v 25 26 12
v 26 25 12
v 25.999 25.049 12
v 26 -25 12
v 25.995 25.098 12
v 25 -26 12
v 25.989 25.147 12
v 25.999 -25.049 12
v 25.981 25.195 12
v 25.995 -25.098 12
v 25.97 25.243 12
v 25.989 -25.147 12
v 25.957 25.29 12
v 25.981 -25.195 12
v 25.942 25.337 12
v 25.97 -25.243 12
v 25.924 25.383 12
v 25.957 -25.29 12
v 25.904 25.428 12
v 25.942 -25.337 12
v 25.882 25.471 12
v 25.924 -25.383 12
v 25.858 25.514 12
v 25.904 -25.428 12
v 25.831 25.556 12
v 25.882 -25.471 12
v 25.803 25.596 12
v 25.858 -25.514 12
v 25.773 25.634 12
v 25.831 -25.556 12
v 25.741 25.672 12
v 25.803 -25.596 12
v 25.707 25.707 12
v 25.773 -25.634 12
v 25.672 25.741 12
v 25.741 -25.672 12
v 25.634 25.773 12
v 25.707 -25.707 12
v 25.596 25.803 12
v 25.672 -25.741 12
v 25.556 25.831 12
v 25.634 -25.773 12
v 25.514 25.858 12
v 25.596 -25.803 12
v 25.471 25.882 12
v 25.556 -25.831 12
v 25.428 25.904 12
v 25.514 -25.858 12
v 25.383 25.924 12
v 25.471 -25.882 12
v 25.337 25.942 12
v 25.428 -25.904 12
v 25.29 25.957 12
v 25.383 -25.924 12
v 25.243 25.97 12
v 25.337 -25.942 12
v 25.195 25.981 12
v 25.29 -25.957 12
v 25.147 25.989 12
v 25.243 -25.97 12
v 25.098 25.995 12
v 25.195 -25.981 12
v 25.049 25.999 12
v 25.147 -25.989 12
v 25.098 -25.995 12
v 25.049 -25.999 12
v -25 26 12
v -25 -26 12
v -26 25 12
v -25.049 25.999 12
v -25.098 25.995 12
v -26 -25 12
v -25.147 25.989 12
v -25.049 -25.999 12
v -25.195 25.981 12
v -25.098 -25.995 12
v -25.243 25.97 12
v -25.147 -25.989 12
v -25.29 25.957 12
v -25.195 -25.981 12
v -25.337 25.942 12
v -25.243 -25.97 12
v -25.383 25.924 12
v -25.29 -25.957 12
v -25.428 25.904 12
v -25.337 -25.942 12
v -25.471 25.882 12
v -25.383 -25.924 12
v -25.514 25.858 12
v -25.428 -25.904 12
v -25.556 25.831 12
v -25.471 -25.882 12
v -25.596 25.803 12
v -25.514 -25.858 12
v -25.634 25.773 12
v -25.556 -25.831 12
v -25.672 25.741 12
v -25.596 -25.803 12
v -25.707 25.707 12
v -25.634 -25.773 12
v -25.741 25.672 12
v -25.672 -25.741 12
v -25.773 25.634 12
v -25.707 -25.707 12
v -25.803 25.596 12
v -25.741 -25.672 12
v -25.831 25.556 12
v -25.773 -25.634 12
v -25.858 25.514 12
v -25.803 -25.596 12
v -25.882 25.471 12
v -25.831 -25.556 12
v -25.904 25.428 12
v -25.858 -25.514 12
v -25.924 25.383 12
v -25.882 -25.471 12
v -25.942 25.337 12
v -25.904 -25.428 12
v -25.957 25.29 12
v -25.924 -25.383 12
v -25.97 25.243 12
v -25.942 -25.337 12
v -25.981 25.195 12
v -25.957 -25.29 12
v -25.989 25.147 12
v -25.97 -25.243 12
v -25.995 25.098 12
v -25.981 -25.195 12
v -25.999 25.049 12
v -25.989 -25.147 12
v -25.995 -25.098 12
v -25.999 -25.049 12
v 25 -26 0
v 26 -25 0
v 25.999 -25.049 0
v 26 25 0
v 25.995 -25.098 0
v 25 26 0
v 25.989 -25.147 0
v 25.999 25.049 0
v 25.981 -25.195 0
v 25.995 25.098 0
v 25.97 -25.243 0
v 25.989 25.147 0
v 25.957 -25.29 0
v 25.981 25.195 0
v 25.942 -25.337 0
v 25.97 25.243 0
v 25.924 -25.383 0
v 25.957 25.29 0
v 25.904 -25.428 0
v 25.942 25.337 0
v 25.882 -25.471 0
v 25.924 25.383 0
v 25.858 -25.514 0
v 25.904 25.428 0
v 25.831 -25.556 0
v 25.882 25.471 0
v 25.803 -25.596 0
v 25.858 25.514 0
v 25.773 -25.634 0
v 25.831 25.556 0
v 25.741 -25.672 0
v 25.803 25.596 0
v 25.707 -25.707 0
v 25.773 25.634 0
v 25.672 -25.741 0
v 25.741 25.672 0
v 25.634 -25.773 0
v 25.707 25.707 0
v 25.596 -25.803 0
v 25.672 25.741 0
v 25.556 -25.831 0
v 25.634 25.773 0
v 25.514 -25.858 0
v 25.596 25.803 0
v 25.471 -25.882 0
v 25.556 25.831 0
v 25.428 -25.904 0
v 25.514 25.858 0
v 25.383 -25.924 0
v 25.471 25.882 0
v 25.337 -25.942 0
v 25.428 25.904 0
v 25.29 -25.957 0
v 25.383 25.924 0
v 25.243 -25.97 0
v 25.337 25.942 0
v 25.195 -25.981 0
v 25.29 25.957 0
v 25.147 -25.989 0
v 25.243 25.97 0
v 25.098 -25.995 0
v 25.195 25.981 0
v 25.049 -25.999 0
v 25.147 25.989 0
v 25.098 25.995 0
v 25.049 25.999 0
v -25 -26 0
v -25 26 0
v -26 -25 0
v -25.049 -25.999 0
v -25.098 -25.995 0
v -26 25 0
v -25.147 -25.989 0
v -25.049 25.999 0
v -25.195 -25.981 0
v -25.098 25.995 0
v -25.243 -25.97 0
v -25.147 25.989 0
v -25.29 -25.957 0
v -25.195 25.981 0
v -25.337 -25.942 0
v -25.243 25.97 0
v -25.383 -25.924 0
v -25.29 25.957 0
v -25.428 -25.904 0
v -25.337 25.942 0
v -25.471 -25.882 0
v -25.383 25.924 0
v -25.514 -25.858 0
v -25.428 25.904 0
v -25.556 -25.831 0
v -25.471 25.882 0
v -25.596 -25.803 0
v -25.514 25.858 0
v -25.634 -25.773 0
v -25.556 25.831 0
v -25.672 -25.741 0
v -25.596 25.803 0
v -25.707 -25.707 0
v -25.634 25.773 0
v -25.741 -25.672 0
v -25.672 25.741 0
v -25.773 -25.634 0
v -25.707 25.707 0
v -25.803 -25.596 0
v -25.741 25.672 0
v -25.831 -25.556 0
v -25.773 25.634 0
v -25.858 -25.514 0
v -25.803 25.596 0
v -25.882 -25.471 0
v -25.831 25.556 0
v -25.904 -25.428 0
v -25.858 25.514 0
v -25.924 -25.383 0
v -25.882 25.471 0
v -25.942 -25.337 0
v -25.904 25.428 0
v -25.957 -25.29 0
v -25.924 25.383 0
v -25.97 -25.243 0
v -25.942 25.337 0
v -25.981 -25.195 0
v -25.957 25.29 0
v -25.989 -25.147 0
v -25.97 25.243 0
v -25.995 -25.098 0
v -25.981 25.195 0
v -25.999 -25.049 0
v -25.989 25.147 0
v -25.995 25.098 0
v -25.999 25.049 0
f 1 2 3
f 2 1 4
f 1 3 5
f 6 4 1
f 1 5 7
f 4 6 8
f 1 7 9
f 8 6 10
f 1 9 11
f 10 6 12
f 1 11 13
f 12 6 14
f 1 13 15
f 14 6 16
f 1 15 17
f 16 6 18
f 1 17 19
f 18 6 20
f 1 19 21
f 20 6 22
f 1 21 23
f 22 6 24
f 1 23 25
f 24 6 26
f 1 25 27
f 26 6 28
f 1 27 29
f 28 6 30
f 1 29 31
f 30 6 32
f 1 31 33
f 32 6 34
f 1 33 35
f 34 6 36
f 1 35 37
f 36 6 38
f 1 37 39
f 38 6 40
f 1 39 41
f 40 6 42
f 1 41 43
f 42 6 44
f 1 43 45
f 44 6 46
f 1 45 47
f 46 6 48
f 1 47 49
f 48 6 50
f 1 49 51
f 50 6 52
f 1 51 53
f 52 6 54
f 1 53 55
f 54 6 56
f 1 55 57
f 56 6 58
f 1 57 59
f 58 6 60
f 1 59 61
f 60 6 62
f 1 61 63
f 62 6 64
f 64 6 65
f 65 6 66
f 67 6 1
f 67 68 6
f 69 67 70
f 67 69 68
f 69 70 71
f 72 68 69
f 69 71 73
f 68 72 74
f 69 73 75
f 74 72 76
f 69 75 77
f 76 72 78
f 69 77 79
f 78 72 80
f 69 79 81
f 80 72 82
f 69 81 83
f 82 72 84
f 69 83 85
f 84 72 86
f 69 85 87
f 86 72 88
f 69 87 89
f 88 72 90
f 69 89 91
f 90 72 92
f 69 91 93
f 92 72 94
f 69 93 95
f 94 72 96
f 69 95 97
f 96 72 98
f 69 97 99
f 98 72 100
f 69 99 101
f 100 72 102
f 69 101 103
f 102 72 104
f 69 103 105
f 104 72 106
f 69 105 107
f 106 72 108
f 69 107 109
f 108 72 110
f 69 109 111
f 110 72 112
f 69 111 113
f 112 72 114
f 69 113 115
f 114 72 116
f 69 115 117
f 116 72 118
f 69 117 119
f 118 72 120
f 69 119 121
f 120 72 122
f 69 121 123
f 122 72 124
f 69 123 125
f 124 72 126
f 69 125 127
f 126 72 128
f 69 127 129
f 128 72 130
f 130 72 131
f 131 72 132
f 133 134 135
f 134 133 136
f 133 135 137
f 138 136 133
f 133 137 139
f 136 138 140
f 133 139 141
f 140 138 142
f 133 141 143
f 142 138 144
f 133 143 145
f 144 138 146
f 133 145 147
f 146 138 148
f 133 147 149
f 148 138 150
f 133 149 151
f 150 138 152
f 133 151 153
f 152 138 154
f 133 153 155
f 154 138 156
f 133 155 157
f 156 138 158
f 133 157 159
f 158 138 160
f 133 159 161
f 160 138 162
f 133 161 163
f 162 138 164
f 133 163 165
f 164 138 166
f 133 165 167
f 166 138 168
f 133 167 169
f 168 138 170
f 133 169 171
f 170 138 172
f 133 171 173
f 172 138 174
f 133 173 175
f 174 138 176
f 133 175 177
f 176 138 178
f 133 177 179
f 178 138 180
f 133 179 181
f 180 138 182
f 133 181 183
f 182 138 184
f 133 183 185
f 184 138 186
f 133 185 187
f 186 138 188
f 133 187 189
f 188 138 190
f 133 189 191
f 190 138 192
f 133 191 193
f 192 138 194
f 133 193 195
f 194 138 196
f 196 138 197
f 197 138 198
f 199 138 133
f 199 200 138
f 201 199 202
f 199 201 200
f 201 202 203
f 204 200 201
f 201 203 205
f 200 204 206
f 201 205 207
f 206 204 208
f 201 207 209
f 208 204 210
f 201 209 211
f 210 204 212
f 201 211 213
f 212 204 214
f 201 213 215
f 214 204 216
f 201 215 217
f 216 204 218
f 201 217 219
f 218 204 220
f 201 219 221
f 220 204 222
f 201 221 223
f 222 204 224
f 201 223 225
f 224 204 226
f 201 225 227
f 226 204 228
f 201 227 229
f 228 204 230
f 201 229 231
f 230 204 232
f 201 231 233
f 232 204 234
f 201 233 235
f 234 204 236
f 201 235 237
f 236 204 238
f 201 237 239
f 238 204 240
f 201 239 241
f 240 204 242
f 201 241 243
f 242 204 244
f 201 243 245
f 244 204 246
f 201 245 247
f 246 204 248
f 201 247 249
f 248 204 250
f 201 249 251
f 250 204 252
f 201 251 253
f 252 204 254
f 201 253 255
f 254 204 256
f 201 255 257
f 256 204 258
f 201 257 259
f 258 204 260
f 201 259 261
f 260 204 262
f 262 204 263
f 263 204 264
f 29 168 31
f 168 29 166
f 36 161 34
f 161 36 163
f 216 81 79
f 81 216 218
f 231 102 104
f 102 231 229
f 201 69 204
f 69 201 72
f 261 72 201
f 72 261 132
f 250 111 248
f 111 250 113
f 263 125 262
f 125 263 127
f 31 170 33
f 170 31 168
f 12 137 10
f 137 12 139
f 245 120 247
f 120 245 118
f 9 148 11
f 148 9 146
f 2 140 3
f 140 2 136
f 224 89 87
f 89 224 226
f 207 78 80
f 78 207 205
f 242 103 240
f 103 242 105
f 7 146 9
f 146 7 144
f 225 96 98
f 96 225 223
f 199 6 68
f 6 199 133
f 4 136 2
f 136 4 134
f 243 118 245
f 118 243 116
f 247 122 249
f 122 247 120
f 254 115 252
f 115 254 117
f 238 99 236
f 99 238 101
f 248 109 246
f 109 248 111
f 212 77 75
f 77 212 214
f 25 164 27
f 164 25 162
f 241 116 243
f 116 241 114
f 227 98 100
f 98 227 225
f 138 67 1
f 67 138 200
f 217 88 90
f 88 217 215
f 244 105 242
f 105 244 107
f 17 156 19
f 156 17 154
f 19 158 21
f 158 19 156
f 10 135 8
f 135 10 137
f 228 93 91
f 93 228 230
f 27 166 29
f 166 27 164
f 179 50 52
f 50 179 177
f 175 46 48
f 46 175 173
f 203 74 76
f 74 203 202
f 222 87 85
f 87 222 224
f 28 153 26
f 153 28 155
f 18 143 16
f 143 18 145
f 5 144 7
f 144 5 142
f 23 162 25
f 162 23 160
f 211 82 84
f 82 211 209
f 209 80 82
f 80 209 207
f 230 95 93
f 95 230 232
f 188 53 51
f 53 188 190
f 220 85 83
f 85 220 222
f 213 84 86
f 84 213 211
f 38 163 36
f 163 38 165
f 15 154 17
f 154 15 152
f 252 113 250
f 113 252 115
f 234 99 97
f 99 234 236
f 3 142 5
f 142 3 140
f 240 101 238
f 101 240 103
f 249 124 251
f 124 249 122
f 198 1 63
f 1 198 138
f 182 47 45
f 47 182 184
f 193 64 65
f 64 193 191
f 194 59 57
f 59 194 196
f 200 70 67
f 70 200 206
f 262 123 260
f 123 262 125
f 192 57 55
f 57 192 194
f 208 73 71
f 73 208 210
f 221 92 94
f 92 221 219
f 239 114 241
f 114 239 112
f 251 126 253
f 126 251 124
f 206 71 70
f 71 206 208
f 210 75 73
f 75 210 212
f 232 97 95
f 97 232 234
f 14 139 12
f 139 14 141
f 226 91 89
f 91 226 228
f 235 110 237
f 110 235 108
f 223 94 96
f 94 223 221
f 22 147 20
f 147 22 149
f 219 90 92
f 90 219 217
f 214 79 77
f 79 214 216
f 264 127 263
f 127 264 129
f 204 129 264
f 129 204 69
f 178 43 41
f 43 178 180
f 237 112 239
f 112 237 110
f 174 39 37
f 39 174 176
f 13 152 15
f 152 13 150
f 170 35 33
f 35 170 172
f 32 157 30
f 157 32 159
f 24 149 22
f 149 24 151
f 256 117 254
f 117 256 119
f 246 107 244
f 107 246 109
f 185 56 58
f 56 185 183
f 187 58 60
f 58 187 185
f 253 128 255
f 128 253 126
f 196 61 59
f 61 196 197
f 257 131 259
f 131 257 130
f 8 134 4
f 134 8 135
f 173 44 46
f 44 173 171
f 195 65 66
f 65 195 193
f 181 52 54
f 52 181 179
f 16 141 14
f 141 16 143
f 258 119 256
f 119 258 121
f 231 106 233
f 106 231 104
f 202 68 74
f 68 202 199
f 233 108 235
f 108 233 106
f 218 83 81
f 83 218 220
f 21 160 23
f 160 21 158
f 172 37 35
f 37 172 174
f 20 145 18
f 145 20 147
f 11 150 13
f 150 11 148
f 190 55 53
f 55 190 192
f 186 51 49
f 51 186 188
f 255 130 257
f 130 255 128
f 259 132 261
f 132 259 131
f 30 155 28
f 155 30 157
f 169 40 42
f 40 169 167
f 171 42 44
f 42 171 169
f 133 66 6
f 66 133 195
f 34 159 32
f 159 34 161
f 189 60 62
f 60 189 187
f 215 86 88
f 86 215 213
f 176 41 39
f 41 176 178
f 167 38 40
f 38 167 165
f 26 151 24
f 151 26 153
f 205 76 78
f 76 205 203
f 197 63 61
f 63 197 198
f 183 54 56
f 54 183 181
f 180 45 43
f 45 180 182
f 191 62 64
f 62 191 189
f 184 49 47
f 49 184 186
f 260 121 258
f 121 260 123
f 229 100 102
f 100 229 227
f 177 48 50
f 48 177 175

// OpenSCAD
EXTRA_MARGIN = 14; // initially 6
SENSOR_WIDTH = 70 + EXTRA_MARGIN;
SENSOR_HEIGHT = 70 + EXTRA_MARGIN;

BASE_THICKNESS = 2; // initially 1
CORNER_CURVE_DIAMETER = 10; // initially 3

WALL_THICKNESS = 2;
TOTAL_WALL_HEIGHT = 32; // initially 25
WALL_HEIGHT = 18;
FRONT_WALL_HEIGHT = TOTAL_WALL_HEIGHT - WALL_HEIGHT + BASE_THICKNESS - 1; // Fix with BASE_THICKNESS - 1 (initial thickness was 1)


/* [MOUNTING ELEMS] */
HOLE_DIAMETER = 3.0; // initially 2.7
HOLE_HOLDER = 6.65;
SCREW_WALL_THICKNESS = 2;
SCREW_HEAD_DIAMETER = 6.4; // M3 screw
SCREW_HEAD_THICKNESS = 3.07; // M3 screw
SCREW_OFFSET = 0.7;


//Cut-outs dimensions
CABLE_PORT_HEIGHT = 21;
AIR_INTAKE_DIAMETER = 7.15;
FAN_SIZE = 35;
FAN_HEIGHT = 10;

PCB_THICKNESS = 1.64;
TOTAL_PCB_THICKNESS = 4.10;
CHIP_THICKNESS = TOTAL_PCB_THICKNESS - PCB_THICKNESS + 1; //initially +0.5
SLOT_HEIGHT = CHIP_THICKNESS + 2.5; //initially + 2

// WEMOS
WEMOS_WIDTH = 61.5;
WEMOS_HEIGHT = 27.5;

WEMOS_TOTAL_THICKNESS = 4.8;
WEMOS_PCB_THICKNESS = PCB_THICKNESS;
WEMOS_SUPPORT_HEIGHT = WEMOS_TOTAL_THICKNESS - WEMOS_PCB_THICKNESS + 2;

WEMOS_OFFSET = 5;
WEMOS_SCREW_OFFSET = 0.5;   //initially 0.8

//DHT22
DHT_WIDTH = 21;
DHT_HEIGHT = 16;
DHT_WIDHT_WITH_HEADER = 26;
DHT_THICKNESS = 7.8;
DHT_HEADER_THICKNESS = 1.6;
DHT_BACK_OFFSET = 2;

DHT_RED_PCB_WIDTH = 40;
DHT_RED_PCB_HEIGHT = 23;
DHT_RED_PCB_THICKNESS = 1.8;
DHT_RED_PCB_OFFSET = 3;
DHT_OFFSET = 8;

OBJ_VISIBLE = false;

EXPLODE = 0;
ROTATE = 180;


$fn = 128;


THICKNESS = 12;

render();


module render(){
    SPS30();
    front(THICKNESS);
    back();
}

module SPS30(){
    width = 41;
    height = 41;
    thickness = THICKNESS;
    
    color("green")
    translate([0,0,thickness/2])
    cube([width,height,thickness],true);
}

module front(thickness){
    WIDHT = 50;
    HEIGHT = 50;
    
    r = 1;
    
    x_offset = WIDHT / 2;
    y_offset = HEIGHT / 2;
    
    
    color("yellow", 0.5)
    hull(){
        translate([x_offset, y_offset, thickness/2])
        cylinder(thickness, r, r, true);
        
        translate([-x_offset, y_offset, thickness/2])
        cylinder(thickness, r, r, true);

        translate([-x_offset, -y_offset, thickness/2])
        cylinder(thickness, r, r, true);

        translate([x_offset, -y_offset, thickness/2])
        cylinder(thickness, r, r, true);    
    }
    
}

module back(){
    
}




//dust_sensor_back();  

//translate([0, 0, WALL_HEIGHT + EXPLODE])
//rotate([0,ROTATE,0])
//dust_sensor_front();

module air_grill(){
    hole_width = 2;
    hole_separator = 2;
    translate_step = hole_width + hole_separator;
    length = 10;
    
    initial_translation = translate_step;
    translate([length/2, -initial_translation, 0])
    for (n = [0:1:5]){
        translate([0,n*translate_step, 0]) 
        cube([length,hole_width,hole_width], true);    
    };     
}

module air_grill_set(){
    translate([0,-5,7])
    air_grill();
    
    translate([0,-5,3])
    air_grill();
    
    translate([0,-5,-1])
    air_grill();        
    
    translate([0,-5,-5])
    air_grill();         
    
    translate([0,-5,-9])
    air_grill();  

    translate([0,-5,-13])
    air_grill();      
}

module dht22redpcb(){
    color("red")     
    cube([DHT_RED_PCB_THICKNESS,DHT_RED_PCB_WIDTH,DHT_RED_PCB_HEIGHT], true);     
}

module dht22whitepart(){
    union(){
        cube([DHT_THICKNESS,DHT_WIDTH,DHT_HEIGHT], true);    
        
        translate([-(DHT_THICKNESS-DHT_HEADER_THICKNESS)/2,(DHT_WIDTH-DHT_WIDHT_WITH_HEADER)/2,0])
        cube([DHT_HEADER_THICKNESS,DHT_WIDHT_WITH_HEADER,DHT_RED_PCB_HEIGHT], true);    
        
        translate([0,0,1.5])
        air_grill_set();
    }    
}

module dht22(){
    union(){
        color("red")
        dht22redpcb();
        
        color("white")
        translate([(DHT_RED_PCB_THICKNESS + DHT_THICKNESS)/2-0.001,(DHT_RED_PCB_WIDTH - DHT_WIDTH)/2 - 12,0])
        dht22whitepart();       
    }
}

module screw_head(height) {;
    cylinder(height,SCREW_HEAD_DIAMETER/2, SCREW_HEAD_DIAMETER/2, true);      
}

module screw_pole(height, additional_thickness){
    pole_diameter = HOLE_DIAMETER + 2*SCREW_WALL_THICKNESS + additional_thickness;
    cylinder(height,pole_diameter/2, pole_diameter/2, true);              
}

module screw_tunnel(height){
    color("white")    
    cylinder(height,HOLE_DIAMETER/2, HOLE_DIAMETER/2, true);                  
}

module screw_port(height){
    screw_diameter = HOLE_DIAMETER + 2*SCREW_WALL_THICKNESS;
    
    difference(){
        cylinder(height,screw_diameter/2, screw_diameter/2, true);              
        cylinder(height*2,HOLE_DIAMETER/2, HOLE_DIAMETER/2, true);              
    }
}

module screw_heads(){
    screw_depth = 3;
    translate_x = (SENSOR_WIDTH-SCREW_HEAD_DIAMETER)/2+SCREW_OFFSET;
    translate_y = (SENSOR_HEIGHT-SCREW_HEAD_DIAMETER)/2+SCREW_OFFSET;    

    union(){      
        color("red")
        translate([translate_x,translate_y,screw_depth/2])
        screw_head(screw_depth);     

        color("red")
        translate([-translate_x,translate_y,screw_depth/2])
        screw_head(screw_depth);             
        
        color("red")
        translate([-translate_x,-translate_y,screw_depth/2])
        screw_head(screw_depth);           
        
        color("red")
        translate([translate_x,-translate_y,screw_depth/2])
        screw_head(screw_depth);    
    }
}

module screw_poles(height, additional_thickness){
    screw_depth = 10;
    translate_x = (SENSOR_WIDTH-SCREW_HEAD_DIAMETER)/2+SCREW_OFFSET;
    translate_y = (SENSOR_HEIGHT-SCREW_HEAD_DIAMETER)/2+SCREW_OFFSET;    

    translate([0,0,height/2])
    union(){      
        color("red")
        translate([translate_x,translate_y,0])
        screw_pole(height, additional_thickness);     

        color("red")
        translate([-translate_x,translate_y,0])
        screw_pole(height, additional_thickness);     
        
        color("red")
        translate([-translate_x,-translate_y,0])
        screw_pole(height, additional_thickness);       
        
        color("red")
        translate([translate_x,-translate_y,0])
        screw_pole(height, additional_thickness);     
    }    
}

module dht22_holder(height){
    size = SCREW_HEAD_DIAMETER-1;
    
    translate([size/2,size/2,height/2])
    color("blue")
    cube([size*2,size,height], true);      
}

module screw_tunnels(height){
    screw_depth = 10;
    translate_x = (SENSOR_WIDTH-SCREW_HEAD_DIAMETER)/2+SCREW_OFFSET;
    translate_y = (SENSOR_HEIGHT-SCREW_HEAD_DIAMETER)/2+SCREW_OFFSET;    

    translate([0,0,height/2])
    union(){      
        translate([translate_x,translate_y,0])
        screw_tunnel(height*2);     

        translate([-translate_x,translate_y,0])
        screw_tunnel(height*2);               
        
        translate([-translate_x,-translate_y,0])
        screw_tunnel(height*2);            
        
        translate([translate_x,-translate_y,0])
        screw_tunnel(height*2);     
    }    
}

module dust_sensor_back(dust_sensor) { 
    wemos_wall_dist=3;
    wemos_fix_offset = 0.2;
    difference(){
        union(){
            translate([0, 0, BASE_THICKNESS/2])
            base();
            
            translate([0, 0, WALL_HEIGHT/2])
            base_with_walls(WALL_HEIGHT);        

            screw_poles(WALL_HEIGHT, 0.8);        
            
            translate([SENSOR_WIDTH/2 - 9, -SENSOR_HEIGHT/2, 0])
            dht22_holder(WALL_HEIGHT);      
      
    
        //    // WEMOS
        //    translate([-(SENSOR_WIDTH-WEMOS_WIDTH)/2+WEMOS_OFFSET,(SENSOR_HEIGHT-WEMOS_HEIGHT)/2-wemos_wall_dist,BASE_THICKNESS+WALL_HEIGHT-2])
        //    rotate([0,0,180])    
        //    scale([1,1,4])
        //    wemos_thick_plate();    
            translate([(SENSOR_WIDTH-HOLE_DIAMETER-EXTRA_MARGIN)/2-9.5, (SENSOR_HEIGHT-HOLE_DIAMETER-EXTRA_MARGIN)/2-3.48, BASE_THICKNESS])    
            screw_slot();
            
            // Extra stabilizer
            translate([-(SENSOR_WIDTH-HOLE_DIAMETER-EXTRA_MARGIN)/2+25, (SENSOR_HEIGHT-HOLE_DIAMETER-EXTRA_MARGIN)/2-3.48, BASE_THICKNESS])        
            stabiliser();  
            
            translate([-(SENSOR_WIDTH-HOLE_DIAMETER-EXTRA_MARGIN)/2+2.37, (SENSOR_HEIGHT-HOLE_DIAMETER-EXTRA_MARGIN)/2-22.47, BASE_THICKNESS])    
            screw_slot();    
            
            translate([(SENSOR_WIDTH-HOLE_DIAMETER-EXTRA_MARGIN)/2-9.5, -(SENSOR_HEIGHT-HOLE_DIAMETER-EXTRA_MARGIN)/2+3.48, BASE_THICKNESS])    
            screw_slot();       
            
            // Extra stabilizer
            translate([-(SENSOR_WIDTH-HOLE_DIAMETER-EXTRA_MARGIN)/2+2.37, -(SENSOR_HEIGHT-HOLE_DIAMETER-EXTRA_MARGIN)/2+3.48, BASE_THICKNESS])    
            stabiliser();            
        };  
        
        screw_heads();        
        screw_tunnels(WALL_HEIGHT);
              
//        // CABLES
//        color("red")
//        translate([-SENSOR_WIDTH/2, (SENSOR_HEIGHT-CABLE_PORT_HEIGHT-EXTRA_MARGIN)/2, BASE_THICKNESS+WALL_HEIGHT/2+2]) //Extra +2
//        cube([8,CABLE_PORT_HEIGHT,WALL_HEIGHT], true);         

        // WEMOS - cutout - fix
        translate([-(SENSOR_WIDTH-WEMOS_WIDTH)/2+WEMOS_OFFSET-wemos_fix_offset,(SENSOR_HEIGHT-WEMOS_HEIGHT)/2-wemos_wall_dist+wemos_fix_offset,BASE_THICKNESS+WALL_HEIGHT-2])
        rotate([0,0,180])    
        scale([1,1,4])   
        wemos_thick_plate();

        // AIR INTAKE      
        color("red")
        translate([SENSOR_WIDTH/2, (SENSOR_HEIGHT-AIR_INTAKE_DIAMETER-EXTRA_MARGIN)/2-15.5, BASE_THICKNESS+AIR_INTAKE_DIAMETER/2+6.2])
        cube([8,AIR_INTAKE_DIAMETER,AIR_INTAKE_DIAMETER], true);  

       // DHT22
        translate([(SENSOR_WIDTH-DHT_RED_PCB_THICKNESS)/2 - DHT_OFFSET, -(SENSOR_HEIGHT-DHT_RED_PCB_WIDTH)/2 + 0.5, BASE_THICKNESS + (DHT_RED_PCB_HEIGHT+SLOT_HEIGHT+PCB_THICKNESS)/2+DHT_BACK_OFFSET])
        dht22();       
    }        
//    // DHT22 - positive
    if(OBJ_VISIBLE){
        translate([(SENSOR_WIDTH-DHT_RED_PCB_THICKNESS)/2 - DHT_OFFSET, -(SENSOR_HEIGHT-DHT_RED_PCB_WIDTH)/2 + 0.5, BASE_THICKNESS + (DHT_RED_PCB_HEIGHT+SLOT_HEIGHT+PCB_THICKNESS)/2+DHT_BACK_OFFSET])
        dht22();            
    }
}
module wemos_thick_plate() {
    cutout = 12;
    
    wemos_width = WEMOS_WIDTH;
    wemos_extra_width = 0.5;
    
    wemos_height = WEMOS_HEIGHT;
    wemos_extra_height = 0.5;
    
    wemos_screw_offset = WEMOS_SCREW_OFFSET;
    wemos_screw_slot_diameter = 3;
    
    wemos_screen_width = 28.31;
    wemos_screen_height = 15.64; // initially 18
    wemos_screen_bottom_offset = 7.5; // initially 7.5
    
    wemos_usb_to_screen = 2.2;
    
    wemos_usb_width = 9.9;
    wemos_usb_height = 12;
    wemos_usb_extra_width = 4;
    
    screw_extra_margin_height = 21;
    screw_extra_margin_thickness = 2.55;
    
    cube([wemos_width+wemos_extra_width,wemos_height+wemos_extra_height,WEMOS_PCB_THICKNESS], true);
}


module wemos_plate() {
    cutout = 12;
    
    wemos_width = WEMOS_WIDTH;
    wemos_extra_width = 0.5;
    
    wemos_height = WEMOS_HEIGHT;
    wemos_extra_height = 0.5;
    
    wemos_screw_offset = WEMOS_SCREW_OFFSET;
    wemos_screw_slot_diameter = 3;
    
    wemos_screen_width = 28.31;
    wemos_screen_height = 15.64; // initially 18
    wemos_screen_bottom_offset = 7.5; // initially 7.5
    
    wemos_usb_to_screen = 2.2;
    
    wemos_usb_width = 9.9;
    wemos_usb_height = 12;
    wemos_usb_extra_width = 4;
    
    screw_extra_margin_height = 21;
    screw_extra_margin_thickness = 2.55;
    
    translate_x = (wemos_width-wemos_screw_slot_diameter)/2 - wemos_screw_offset;
    translate_y = (wemos_height-wemos_screw_slot_diameter)/2 - wemos_screw_offset;
    
    difference(){
        cube([wemos_width+wemos_extra_width,wemos_height+wemos_extra_height,WEMOS_PCB_THICKNESS], true);
        
        translate([translate_x, translate_y, 0])
        cylinder(SLOT_HEIGHT,wemos_screw_slot_diameter/2, wemos_screw_slot_diameter/2, true); 
        
        translate([translate_x, -translate_y, 0])
        cylinder(SLOT_HEIGHT,wemos_screw_slot_diameter/2, wemos_screw_slot_diameter/2, true);         
        
        translate([-translate_x, -translate_y, 0])
        cylinder(SLOT_HEIGHT,wemos_screw_slot_diameter/2, wemos_screw_slot_diameter/2, true);                 
        
        translate([-translate_x, translate_y, 0])
        cylinder(SLOT_HEIGHT,wemos_screw_slot_diameter/2, wemos_screw_slot_diameter/2, true);                         
    }
    
    // Screen cut out
    color("red")
    translate([(wemos_width-wemos_screen_width)/2 - wemos_usb_width - wemos_usb_to_screen+WEMOS_OFFSET, -(wemos_height-wemos_screen_height)/2 + wemos_screen_bottom_offset, cutout/2])  
    cube([wemos_screen_width,wemos_screen_height,cutout], true);    
    
    // USB port
    color("red")
    translate([(wemos_width-wemos_usb_width+wemos_usb_extra_width)/2+WEMOS_OFFSET, 0, cutout/2-2])    
    cube([wemos_usb_width+wemos_usb_extra_width,wemos_usb_height,cutout], true);     
    
    // Additional screw cutouts
    color("green")
    translate([(wemos_width-wemos_usb_width)/2-4+WEMOS_OFFSET, 0, (WEMOS_PCB_THICKNESS + screw_extra_margin_thickness)/2])  
    cube([wemos_usb_width,screw_extra_margin_height,screw_extra_margin_thickness], true);            
}

module wemos_single_support() {
    wemos_screw_offset = WEMOS_SCREW_OFFSET;
    wemos_screw_slot_diameter = 3;    
    
    support_wall_thickness = 1.5;
    support_diameter = wemos_screw_slot_diameter + 2*support_wall_thickness; 
    
    difference(){
        cylinder(WEMOS_SUPPORT_HEIGHT,support_diameter/2, support_diameter/2, true); 
        cylinder(WEMOS_SUPPORT_HEIGHT*2,wemos_screw_slot_diameter/2, wemos_screw_slot_diameter/2, true);         
    }
}

module wemos_supports(){
    support_height = 4;
    
    wemos_width = WEMOS_WIDTH;
    wemos_height = WEMOS_HEIGHT;    
    
    wemos_screw_offset = WEMOS_SCREW_OFFSET;
    wemos_screw_slot_diameter = 3;    
    
    translate_x = (wemos_width-wemos_screw_slot_diameter)/2 - wemos_screw_offset;
    translate_y = (wemos_height-wemos_screw_slot_diameter)/2 - wemos_screw_offset;    

    union(){
        translate([translate_x, translate_y, 0])
        wemos_single_support();
        
        translate([translate_x, -translate_y, 0])
        wemos_single_support();
        
        translate([-translate_x, -translate_y, 0])
        wemos_single_support();
        
        translate([-translate_x, translate_y, 0])
        wemos_single_support();
    };     
}

module dust_sensor_front(dust_sensor) {  
    wemos_width = WEMOS_WIDTH;
    wemos_height = WEMOS_HEIGHT;    
    
    wemos_screw_offset = WEMOS_SCREW_OFFSET;
    wemos_screw_slot_diameter = 3;    
    
    translate_x = (wemos_width-wemos_screw_slot_diameter)/2 - wemos_screw_offset;
    translate_y = (wemos_height-wemos_screw_slot_diameter)/2 - wemos_screw_offset;
    
    wemos_wall_dist = 3;
    
    dht_support_height = 4;
    dht_support_width = 5;
    dht_support_thickness = 4;
    
    difference(){
        union(){
            translate([0, 0, FRONT_WALL_HEIGHT/2])
            base_with_walls(FRONT_WALL_HEIGHT);                  
           
            translate([0, 0, FRONT_WALL_HEIGHT - BASE_THICKNESS/2])
            base();
            
            translate([-(SENSOR_WIDTH-WEMOS_WIDTH)/2+WEMOS_OFFSET,(SENSOR_HEIGHT-WEMOS_HEIGHT)/2-wemos_wall_dist, FRONT_WALL_HEIGHT - BASE_THICKNESS - WEMOS_SUPPORT_HEIGHT/2])
            wemos_supports();
            
            screw_poles(FRONT_WALL_HEIGHT, 0.8);      

            //dht22 support
            translate([SENSOR_WIDTH/2 - 9, -SENSOR_HEIGHT/2, 0])
            dht22_holder(FRONT_WALL_HEIGHT);            
            
            color("blue")
            translate([(SENSOR_WIDTH-dht_support_width)/2-6.5,-2,FRONT_WALL_HEIGHT - BASE_THICKNESS - dht_support_thickness/2 - 0])
            cube([dht_support_width,dht_support_height,dht_support_thickness], true);
        };                 
        
        // DHT22
        translate([(SENSOR_WIDTH-DHT_RED_PCB_THICKNESS)/2 - DHT_OFFSET, -(SENSOR_HEIGHT-DHT_RED_PCB_WIDTH)/2 + 0.5, FRONT_WALL_HEIGHT - BASE_THICKNESS - DHT_RED_PCB_HEIGHT/2])
        dht22();        
        
        //Screw tunnels
        translate([0, 0, -FRONT_WALL_HEIGHT/2-BASE_THICKNESS])        
        screw_tunnels(FRONT_WALL_HEIGHT);        
        
        // FAN (on top)
        color("red")
        translate([-SENSOR_WIDTH/2, -(SENSOR_HEIGHT-FAN_SIZE-EXTRA_MARGIN)/2+5, FAN_HEIGHT/2])
        cube([8,FAN_SIZE,FAN_HEIGHT], true);        
        
        // Wemos plate with the screen and USB
        translate([-(SENSOR_WIDTH-WEMOS_WIDTH)/2+WEMOS_OFFSET,(SENSOR_HEIGHT-WEMOS_HEIGHT)/2-wemos_wall_dist,FRONT_WALL_HEIGHT-BASE_THICKNESS - WEMOS_SUPPORT_HEIGHT - WEMOS_PCB_THICKNESS/2])
        rotate([0,0,180])
        wemos_plate();        

        // Wemos thicker cutout
        translate([-(SENSOR_WIDTH-WEMOS_WIDTH)/2+WEMOS_OFFSET,(SENSOR_HEIGHT-WEMOS_HEIGHT)/2-wemos_wall_dist,FRONT_WALL_HEIGHT-BASE_THICKNESS - WEMOS_SUPPORT_HEIGHT - WEMOS_PCB_THICKNESS*2-2])    
        scale([1,1,6])
        wemos_thick_plate();         
    }      
    
//    // DHT22 - positive
    if(OBJ_VISIBLE){
        translate([(SENSOR_WIDTH-DHT_RED_PCB_THICKNESS)/2 - DHT_OFFSET, -(SENSOR_HEIGHT-DHT_RED_PCB_WIDTH)/2 + 0.5, FRONT_WALL_HEIGHT - BASE_THICKNESS - DHT_RED_PCB_HEIGHT/2])
        dht22();  
    }
           
//    
//    translate([-(SENSOR_WIDTH-WEMOS_WIDTH)/2+WEMOS_OFFSET,(SENSOR_HEIGHT-WEMOS_HEIGHT)/2-wemos_wall_dist,FRONT_WALL_HEIGHT-BASE_THICKNESS - WEMOS_SUPPORT_HEIGHT - WEMOS_PCB_THICKNESS/2])
//    rotate([0,0,180])
//    wemos_plate(); 
//    
    if(OBJ_VISIBLE){
        translate([-(SENSOR_WIDTH-WEMOS_WIDTH)/2+WEMOS_OFFSET,(SENSOR_HEIGHT-WEMOS_HEIGHT)/2-wemos_wall_dist,FRONT_WALL_HEIGHT-BASE_THICKNESS - WEMOS_SUPPORT_HEIGHT - WEMOS_PCB_THICKNESS*2-2])    
        scale([1,1,6])
        wemos_thick_plate();        
    }
}

module rounded_corners(width, height, depth, corner_curve){
    x_translate = width-corner_curve;
    y_translate = height-corner_curve;     
    
    hull(){
            translate([-x_translate/2, -y_translate/2, 0])
            cylinder(depth,corner_curve/2, corner_curve/2, true);    
            
            translate([-x_translate/2, y_translate/2, 0])
            cylinder(depth,corner_curve/2, corner_curve/2, true);

            translate([x_translate/2, y_translate/2, 0])
            cylinder(depth,corner_curve/2, corner_curve/2, true);        
            
            translate([x_translate/2, -y_translate/2, 0])
            cylinder(depth,corner_curve/2, corner_curve/2, true);        
    }        
}

module base(){
    x_translate = SENSOR_WIDTH-CORNER_CURVE_DIAMETER;
    y_translate = SENSOR_HEIGHT-CORNER_CURVE_DIAMETER;    
    
    difference(){
         rounded_corners(SENSOR_WIDTH, SENSOR_HEIGHT, BASE_THICKNESS, CORNER_CURVE_DIAMETER);
//         cube([SENSOR_WIDTH-22,SENSOR_HEIGHT-22,BASE_THICKNESS*2], true);            
    }
}

module base_with_walls(wall_height){    
    difference(){
        // OUTSIDE
        rounded_corners(SENSOR_WIDTH+WALL_THICKNESS*2, SENSOR_HEIGHT+WALL_THICKNESS*2, wall_height, CORNER_CURVE_DIAMETER);        
        
        // INSIDE
        rounded_corners(SENSOR_WIDTH, SENSOR_HEIGHT, wall_height*2, CORNER_CURVE_DIAMETER);
    }
}

module stabiliser(){
    translate([0,0,CHIP_THICKNESS/2])
    cylinder(CHIP_THICKNESS,HOLE_HOLDER/2, HOLE_HOLDER/2, true);     
}

module screw_slot(){
    union(){
        translate([0,0,CHIP_THICKNESS/2])
        cylinder(CHIP_THICKNESS,HOLE_HOLDER/2, HOLE_HOLDER/2, true);            
        
        translate([0,0,SLOT_HEIGHT/2])
        cylinder(SLOT_HEIGHT,HOLE_DIAMETER/2, HOLE_DIAMETER/2, true);                    
    }
}
